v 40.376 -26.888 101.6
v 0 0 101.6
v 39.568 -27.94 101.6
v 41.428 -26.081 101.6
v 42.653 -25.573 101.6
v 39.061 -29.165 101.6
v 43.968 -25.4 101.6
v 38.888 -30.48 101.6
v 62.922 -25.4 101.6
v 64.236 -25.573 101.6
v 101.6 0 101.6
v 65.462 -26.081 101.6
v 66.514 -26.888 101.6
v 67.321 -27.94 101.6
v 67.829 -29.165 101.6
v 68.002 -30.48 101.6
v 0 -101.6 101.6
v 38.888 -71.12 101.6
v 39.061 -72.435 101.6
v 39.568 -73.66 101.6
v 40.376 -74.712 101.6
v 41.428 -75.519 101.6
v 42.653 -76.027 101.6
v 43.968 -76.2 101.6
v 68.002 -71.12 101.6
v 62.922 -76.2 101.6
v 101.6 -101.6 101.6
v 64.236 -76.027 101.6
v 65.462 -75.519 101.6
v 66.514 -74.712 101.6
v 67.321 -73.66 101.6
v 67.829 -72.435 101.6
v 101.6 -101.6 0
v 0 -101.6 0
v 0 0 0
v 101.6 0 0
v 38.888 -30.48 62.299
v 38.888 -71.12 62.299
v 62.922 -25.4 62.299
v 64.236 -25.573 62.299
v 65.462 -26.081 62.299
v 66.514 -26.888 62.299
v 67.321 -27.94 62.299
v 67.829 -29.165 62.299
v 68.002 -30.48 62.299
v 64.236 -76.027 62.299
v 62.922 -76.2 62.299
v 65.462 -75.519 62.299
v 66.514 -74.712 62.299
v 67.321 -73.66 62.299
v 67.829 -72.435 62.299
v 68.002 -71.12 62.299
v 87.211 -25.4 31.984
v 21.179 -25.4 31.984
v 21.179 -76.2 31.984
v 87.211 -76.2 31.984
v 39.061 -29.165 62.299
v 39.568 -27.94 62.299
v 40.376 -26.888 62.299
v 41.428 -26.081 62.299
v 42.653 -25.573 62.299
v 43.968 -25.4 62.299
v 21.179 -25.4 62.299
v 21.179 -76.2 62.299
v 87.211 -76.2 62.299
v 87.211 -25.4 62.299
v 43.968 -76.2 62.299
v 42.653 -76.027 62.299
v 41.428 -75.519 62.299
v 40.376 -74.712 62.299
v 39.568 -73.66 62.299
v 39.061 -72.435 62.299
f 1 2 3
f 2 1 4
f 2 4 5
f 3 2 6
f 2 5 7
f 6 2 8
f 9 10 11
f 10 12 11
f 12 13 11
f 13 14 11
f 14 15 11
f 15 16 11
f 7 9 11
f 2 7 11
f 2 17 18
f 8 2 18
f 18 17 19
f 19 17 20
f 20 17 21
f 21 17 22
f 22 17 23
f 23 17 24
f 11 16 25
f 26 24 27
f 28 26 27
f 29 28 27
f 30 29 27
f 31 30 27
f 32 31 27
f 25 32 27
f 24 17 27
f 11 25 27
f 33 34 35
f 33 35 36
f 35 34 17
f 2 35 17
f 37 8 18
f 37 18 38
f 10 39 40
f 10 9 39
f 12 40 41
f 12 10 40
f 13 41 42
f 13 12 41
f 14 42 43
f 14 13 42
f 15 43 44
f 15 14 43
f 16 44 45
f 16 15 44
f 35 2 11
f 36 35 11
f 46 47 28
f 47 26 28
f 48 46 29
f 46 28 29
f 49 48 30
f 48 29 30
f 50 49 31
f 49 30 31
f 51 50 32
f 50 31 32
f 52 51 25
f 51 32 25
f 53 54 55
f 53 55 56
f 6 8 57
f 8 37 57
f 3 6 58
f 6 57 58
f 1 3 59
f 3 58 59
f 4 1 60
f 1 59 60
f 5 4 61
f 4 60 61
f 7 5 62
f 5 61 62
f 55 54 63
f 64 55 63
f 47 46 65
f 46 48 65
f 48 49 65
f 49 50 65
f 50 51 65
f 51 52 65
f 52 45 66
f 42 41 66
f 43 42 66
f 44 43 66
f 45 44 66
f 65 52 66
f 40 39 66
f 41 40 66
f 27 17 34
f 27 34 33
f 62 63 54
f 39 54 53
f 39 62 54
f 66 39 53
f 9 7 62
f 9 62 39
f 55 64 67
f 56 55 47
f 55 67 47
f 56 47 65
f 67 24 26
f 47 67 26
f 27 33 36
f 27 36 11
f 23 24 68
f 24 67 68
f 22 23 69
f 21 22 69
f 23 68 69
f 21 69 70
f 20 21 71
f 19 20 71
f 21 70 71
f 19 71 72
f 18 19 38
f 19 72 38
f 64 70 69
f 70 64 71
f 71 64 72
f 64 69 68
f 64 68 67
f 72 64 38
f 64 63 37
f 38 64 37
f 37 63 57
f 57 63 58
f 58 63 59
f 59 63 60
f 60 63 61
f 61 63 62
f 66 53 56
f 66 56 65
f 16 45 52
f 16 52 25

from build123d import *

# Parameters (mm, degrees)
F0_W     = 101.6
F0_H     = 101.6
F1_DEPTH = 50.8
F2_W     = 17.7085362375
F2_H     = 30.314616859
F2_W_2   = 19.2092582583
F3_DEPTH = 25.4
F5_R     = 5.08


with BuildPart() as f1:
    # F0 (on Front) → F1 (new body)
    with BuildSketch(Plane.XZ):
        with Locations((50.8, 50.8)):
            Rectangle(F0_W, F0_H)
    extrude(amount=F1_DEPTH)

    # F2 (on face) → F3 (cut)
    with BuildSketch(Plane.XZ.offset(50.8)):
        Polygon((68.001665175, 101.6), (38.8876236975, 101.6), (38.8876236975, 62.298912555), (38.8876236975, 31.984295696), (68.001665175, 31.984295696), (68.001665175, 62.298912555), align=None)
        with Locations((30.0333555788, 47.1416041255)):
            Rectangle(F2_W, F2_H)
        with Locations((77.6062943041, 47.1416041255)):
            Rectangle(F2_W_2, F2_H)
    extrude(amount=-F3_DEPTH, mode=Mode.SUBTRACT)

    # F4: F1 across face


with BuildPart() as f1_1:
    add(f1.part)
    add(f1.part.mirror(Plane(origin=(49.4313994673, -50.8, 46.8540587323), x_dir=(1, 0, 0), z_dir=(0, -1, 0))))

    # F5
    f5_edges = [f1_1.edges().sort_by_distance(p)[0] for p in [
        (68.001665, -25.4, 81.949456),
        (38.887624, -25.4, 81.949456),
        (68.001665, -76.2, 81.949456),
        (38.887624, -76.2, 81.949456),
    ]]
    fillet(f5_edges, radius=F5_R)


solid = f1_1.part
